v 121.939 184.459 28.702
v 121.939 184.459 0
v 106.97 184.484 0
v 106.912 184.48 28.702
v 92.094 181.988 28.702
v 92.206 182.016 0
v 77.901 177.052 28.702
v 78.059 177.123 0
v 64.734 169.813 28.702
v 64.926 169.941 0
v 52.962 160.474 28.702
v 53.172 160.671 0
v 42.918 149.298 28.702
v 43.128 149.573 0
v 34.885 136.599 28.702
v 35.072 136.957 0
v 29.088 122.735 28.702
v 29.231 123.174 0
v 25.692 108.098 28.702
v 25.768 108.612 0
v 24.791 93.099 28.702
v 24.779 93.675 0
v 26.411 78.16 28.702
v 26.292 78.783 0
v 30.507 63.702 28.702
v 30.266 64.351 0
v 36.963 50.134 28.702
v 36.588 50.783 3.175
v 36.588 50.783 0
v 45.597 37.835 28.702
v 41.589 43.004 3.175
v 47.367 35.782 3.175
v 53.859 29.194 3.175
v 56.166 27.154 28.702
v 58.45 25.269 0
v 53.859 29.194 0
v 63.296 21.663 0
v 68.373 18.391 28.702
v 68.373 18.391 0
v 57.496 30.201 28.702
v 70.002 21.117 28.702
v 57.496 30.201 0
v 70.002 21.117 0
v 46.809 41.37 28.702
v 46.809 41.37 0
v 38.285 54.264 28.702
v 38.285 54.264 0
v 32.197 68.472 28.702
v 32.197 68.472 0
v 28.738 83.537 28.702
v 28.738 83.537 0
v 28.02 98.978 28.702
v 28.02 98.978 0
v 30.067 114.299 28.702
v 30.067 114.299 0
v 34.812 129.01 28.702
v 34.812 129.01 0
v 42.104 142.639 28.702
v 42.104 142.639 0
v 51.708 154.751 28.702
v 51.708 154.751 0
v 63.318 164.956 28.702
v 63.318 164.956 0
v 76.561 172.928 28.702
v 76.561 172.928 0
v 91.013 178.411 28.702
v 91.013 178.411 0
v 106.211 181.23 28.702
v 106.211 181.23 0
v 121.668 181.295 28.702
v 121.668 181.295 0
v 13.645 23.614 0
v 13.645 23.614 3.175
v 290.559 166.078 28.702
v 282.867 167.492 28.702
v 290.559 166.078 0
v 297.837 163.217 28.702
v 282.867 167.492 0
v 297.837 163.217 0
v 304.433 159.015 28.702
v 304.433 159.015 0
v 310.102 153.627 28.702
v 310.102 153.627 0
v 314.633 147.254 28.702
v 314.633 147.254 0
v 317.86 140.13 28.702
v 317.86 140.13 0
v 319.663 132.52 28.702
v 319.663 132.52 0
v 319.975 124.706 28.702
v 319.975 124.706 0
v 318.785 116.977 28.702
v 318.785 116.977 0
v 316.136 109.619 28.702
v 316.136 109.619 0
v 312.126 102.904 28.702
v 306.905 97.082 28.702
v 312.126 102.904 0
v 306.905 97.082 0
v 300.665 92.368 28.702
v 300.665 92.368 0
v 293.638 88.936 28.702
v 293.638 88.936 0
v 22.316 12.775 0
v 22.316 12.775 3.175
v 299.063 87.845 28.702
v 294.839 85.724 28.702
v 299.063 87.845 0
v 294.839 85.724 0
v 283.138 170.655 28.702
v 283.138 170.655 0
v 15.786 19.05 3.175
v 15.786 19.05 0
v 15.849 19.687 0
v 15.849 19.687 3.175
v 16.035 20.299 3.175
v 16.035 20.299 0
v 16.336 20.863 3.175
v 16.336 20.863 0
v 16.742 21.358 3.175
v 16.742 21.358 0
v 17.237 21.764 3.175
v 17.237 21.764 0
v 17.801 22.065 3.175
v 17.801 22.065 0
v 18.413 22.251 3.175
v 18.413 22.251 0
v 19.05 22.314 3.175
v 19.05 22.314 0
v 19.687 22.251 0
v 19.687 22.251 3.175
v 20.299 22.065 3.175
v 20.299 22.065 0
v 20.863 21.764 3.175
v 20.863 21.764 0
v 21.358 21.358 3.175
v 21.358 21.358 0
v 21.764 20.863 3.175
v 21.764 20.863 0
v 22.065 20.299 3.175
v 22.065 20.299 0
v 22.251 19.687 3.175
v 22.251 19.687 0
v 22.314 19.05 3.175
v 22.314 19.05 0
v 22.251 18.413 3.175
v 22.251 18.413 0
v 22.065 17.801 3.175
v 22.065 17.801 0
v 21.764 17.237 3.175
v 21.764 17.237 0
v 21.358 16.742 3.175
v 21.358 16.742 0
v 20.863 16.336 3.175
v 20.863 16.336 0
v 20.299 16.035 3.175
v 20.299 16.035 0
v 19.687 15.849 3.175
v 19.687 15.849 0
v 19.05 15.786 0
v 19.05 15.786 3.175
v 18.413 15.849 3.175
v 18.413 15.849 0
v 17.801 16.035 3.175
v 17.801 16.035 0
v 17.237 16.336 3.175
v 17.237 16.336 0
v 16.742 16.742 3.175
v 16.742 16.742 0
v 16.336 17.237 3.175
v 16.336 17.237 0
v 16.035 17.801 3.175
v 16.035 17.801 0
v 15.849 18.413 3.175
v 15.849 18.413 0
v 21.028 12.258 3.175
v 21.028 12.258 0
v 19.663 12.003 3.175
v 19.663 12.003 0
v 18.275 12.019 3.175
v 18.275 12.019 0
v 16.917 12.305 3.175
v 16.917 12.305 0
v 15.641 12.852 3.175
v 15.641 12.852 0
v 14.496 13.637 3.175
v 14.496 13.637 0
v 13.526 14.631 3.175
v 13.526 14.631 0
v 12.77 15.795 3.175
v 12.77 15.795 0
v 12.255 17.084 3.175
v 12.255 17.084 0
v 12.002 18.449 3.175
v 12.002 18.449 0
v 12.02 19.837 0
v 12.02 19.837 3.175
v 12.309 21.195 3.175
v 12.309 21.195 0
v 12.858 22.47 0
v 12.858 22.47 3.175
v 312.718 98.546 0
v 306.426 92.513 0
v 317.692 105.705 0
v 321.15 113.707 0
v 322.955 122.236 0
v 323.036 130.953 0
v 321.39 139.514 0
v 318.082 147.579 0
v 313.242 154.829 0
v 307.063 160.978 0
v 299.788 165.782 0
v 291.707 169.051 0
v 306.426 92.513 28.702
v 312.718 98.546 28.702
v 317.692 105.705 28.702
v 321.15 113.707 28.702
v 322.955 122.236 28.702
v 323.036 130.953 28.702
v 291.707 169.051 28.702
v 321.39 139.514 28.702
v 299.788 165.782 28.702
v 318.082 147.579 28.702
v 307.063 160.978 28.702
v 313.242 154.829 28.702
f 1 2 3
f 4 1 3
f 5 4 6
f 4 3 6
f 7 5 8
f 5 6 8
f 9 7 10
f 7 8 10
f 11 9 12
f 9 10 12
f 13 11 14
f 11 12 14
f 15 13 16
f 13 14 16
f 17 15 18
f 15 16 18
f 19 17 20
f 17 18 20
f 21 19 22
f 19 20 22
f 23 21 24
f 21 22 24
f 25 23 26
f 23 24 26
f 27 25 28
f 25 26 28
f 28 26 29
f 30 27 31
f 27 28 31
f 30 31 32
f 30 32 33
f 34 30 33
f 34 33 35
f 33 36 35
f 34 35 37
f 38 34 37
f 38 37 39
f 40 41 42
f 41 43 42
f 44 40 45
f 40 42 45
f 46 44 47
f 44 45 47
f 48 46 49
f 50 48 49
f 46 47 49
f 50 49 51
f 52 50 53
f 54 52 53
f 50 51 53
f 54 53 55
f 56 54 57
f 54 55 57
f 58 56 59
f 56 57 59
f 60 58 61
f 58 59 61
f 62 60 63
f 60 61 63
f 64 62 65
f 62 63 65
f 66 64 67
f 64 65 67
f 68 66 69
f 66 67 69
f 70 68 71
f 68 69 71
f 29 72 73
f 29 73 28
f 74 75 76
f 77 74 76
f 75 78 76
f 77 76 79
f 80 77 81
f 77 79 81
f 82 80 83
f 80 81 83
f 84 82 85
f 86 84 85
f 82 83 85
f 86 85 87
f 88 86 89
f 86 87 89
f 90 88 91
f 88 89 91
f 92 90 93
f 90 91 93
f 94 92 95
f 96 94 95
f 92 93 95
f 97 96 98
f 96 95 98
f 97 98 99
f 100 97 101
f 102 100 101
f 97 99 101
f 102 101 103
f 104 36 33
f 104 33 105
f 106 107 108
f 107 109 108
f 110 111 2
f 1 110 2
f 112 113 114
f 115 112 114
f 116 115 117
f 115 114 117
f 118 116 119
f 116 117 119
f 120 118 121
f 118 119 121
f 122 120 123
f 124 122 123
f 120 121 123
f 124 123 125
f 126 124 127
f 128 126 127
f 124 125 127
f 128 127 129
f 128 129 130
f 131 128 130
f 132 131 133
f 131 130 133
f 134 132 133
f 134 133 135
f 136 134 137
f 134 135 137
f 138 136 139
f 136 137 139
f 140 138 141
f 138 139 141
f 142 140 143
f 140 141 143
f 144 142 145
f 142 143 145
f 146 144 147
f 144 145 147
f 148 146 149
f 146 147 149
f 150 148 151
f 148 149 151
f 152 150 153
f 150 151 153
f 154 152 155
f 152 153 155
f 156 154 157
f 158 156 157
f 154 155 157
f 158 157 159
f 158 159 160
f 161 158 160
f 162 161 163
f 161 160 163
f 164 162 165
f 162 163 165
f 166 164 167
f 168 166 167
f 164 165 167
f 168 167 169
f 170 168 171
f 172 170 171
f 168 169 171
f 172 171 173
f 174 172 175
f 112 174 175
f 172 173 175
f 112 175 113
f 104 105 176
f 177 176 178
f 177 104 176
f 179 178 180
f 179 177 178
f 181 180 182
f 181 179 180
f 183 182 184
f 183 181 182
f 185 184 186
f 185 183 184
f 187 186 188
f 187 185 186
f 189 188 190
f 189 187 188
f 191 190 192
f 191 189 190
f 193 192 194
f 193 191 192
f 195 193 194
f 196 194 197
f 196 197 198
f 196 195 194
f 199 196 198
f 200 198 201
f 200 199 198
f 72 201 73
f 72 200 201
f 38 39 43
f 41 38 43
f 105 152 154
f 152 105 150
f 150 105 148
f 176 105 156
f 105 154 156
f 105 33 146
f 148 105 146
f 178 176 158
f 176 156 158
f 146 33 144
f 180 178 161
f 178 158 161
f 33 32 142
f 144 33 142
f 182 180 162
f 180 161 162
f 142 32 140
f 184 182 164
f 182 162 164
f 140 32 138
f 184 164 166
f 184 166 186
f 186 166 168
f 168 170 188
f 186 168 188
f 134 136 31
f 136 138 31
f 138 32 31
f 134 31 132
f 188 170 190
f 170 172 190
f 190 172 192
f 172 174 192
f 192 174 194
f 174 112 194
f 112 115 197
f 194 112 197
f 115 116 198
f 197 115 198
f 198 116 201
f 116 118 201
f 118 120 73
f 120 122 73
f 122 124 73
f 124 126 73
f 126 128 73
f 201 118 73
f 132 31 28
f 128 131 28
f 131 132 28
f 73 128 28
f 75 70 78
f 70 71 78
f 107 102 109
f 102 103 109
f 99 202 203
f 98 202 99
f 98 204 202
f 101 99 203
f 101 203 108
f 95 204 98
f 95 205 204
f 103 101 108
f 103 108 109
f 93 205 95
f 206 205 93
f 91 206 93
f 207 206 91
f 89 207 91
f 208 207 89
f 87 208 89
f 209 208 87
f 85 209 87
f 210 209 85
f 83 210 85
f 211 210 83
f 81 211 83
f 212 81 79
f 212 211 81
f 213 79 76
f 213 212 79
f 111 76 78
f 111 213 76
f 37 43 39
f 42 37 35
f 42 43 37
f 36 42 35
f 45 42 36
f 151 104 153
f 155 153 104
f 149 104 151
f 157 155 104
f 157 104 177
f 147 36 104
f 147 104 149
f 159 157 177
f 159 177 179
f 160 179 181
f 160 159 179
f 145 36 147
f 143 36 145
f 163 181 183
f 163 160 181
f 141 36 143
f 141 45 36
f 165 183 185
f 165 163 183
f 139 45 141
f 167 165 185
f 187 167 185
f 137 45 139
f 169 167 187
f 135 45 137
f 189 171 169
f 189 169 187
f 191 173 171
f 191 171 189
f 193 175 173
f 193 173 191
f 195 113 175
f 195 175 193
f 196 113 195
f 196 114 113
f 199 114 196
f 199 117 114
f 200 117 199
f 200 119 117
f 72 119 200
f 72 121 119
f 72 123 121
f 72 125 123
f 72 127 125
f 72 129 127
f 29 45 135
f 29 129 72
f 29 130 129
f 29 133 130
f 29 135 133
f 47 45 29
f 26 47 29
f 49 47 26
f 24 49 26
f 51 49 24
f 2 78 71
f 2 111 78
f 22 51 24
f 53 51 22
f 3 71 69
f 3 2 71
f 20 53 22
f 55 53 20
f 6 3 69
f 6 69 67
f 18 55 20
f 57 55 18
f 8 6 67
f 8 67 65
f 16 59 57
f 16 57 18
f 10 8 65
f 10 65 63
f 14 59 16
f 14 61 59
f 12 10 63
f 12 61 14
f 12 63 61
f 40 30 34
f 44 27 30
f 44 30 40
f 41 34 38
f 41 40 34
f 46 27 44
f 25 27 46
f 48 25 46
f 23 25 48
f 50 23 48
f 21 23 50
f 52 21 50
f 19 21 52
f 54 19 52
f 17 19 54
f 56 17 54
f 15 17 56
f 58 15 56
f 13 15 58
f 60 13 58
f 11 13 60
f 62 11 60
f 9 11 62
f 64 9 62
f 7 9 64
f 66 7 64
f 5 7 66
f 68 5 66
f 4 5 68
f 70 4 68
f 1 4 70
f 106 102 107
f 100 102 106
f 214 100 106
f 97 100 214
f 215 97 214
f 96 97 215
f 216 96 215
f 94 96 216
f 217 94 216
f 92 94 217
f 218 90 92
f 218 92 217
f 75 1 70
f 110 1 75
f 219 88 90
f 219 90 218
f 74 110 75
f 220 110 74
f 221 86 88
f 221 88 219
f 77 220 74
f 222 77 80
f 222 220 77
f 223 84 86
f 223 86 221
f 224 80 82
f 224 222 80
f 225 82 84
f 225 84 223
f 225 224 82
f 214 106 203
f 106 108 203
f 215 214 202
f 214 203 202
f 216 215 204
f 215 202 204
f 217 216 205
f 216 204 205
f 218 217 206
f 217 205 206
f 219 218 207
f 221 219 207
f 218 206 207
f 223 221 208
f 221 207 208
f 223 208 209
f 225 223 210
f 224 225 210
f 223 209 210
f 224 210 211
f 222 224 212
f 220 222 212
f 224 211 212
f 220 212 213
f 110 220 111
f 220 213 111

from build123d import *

# Parameters (mm, degrees)
BOSS_EXTRUDE1_DEPTH = 25.4
SKETCH2_R           = 7.0739
SKETCH2_R_2         = 3.2639
BOSS_EXTRUDE2_DEPTH = 3.175
BOSS_EXTRUDE3_DEPTH = 3.302


with BuildPart() as part:
    # Sketch1 → Boss-Extrude1 (new body)
    with BuildSketch(Plane.XY):
        with BuildLine():
            ThreePointArc((70.001721328, 21.116929737), (32.109818913, 121.760822938), (121.667937999, 181.295122405))
            Line((121.667937999, 181.295122405), (282.867264941, 167.491822308))
            ThreePointArc((282.867264941, 167.491822308), (319.66332332, 132.52036188), (293.637822612, 88.935659637))
            Line((293.637822612, 88.935659637), (294.839214659, 85.723778364))
            Line((294.839214659, 85.723778364), (299.063190222, 87.84501085))
            ThreePointArc((299.063190222, 87.84501085), (322.426612475, 135.274348553), (283.138145015, 170.655245926))
            Line((283.138145015, 170.655245926), (121.938818073, 184.458546023))
            ThreePointArc((121.938818073, 184.458546023), (29.088121079, 122.735485546), (68.373108141, 18.391449213))
            Line((68.373108141, 18.391449213), (70.001721328, 21.116929737))
        make_face()
    extrude(amount=BOSS_EXTRUDE1_DEPTH)

    # Sketch2 → Boss-Extrude2 (add)
    # profile 1 of 2: a face of its own
    with BuildSketch(Plane(origin=(0, 0, 0), x_dir=(-1, 0, 0), z_dir=(0, 0, -1))):
        with BuildLine():
            ThreePointArc((-36.587701927, 50.782990283), (-44.384911147, 39.317928918), (-53.858754358, 29.194174745))
            Line((-53.858754358, 29.194174745), (-22.316186857, 12.775282108))
            ThreePointArc((-22.316186857, 12.775282108), (-23.932636358, 13.931413925), (-25.163710326, 15.491544259))
            ThreePointArc((-25.163710326, 15.491544259), (-23.930769686, 24.17036605), (-15.202863294, 24.986295173))
            ThreePointArc((-15.202863294, 24.986295173), (-14.373460165, 24.357545231), (-13.645291854, 23.613900861))
            Line((-13.645291854, 23.613900861), (-36.587701927, 50.782990283))
        make_face()
    # profile 2 of 2: a face of its own
    with BuildSketch(Plane(origin=(0, 0, 0), x_dir=(-1, 0, 0), z_dir=(0, 0, -1))):
        with Locations((-19.05, 19.05)):
            Circle(SKETCH2_R)
        with Locations((-19.05, 19.05)):
            Circle(SKETCH2_R_2, mode=Mode.SUBTRACT)
    extrude(amount=-BOSS_EXTRUDE2_DEPTH)

    # Sketch3 → Boss-Extrude3 (add)
    with BuildSketch(Plane.XY.offset(25.4)):
        with BuildLine():
            Line((68.373108141, 18.391449213), (70.001721328, 21.116929737))
            ThreePointArc((70.001721328, 21.116929737), (32.109818913, 121.760822938), (121.667937999, 181.295122405))
            Line((121.667937999, 181.295122405), (282.867264941, 167.491822308))
            ThreePointArc((282.867264941, 167.491822308), (319.66332332, 132.52036188), (293.637822612, 88.935659637))
            Line((293.637822612, 88.935659637), (294.839214659, 85.723778364))
            Line((294.839214659, 85.723778364), (299.063190222, 87.84501085))
            ThreePointArc((299.063190222, 87.84501085), (322.426612475, 135.274348553), (283.138145015, 170.655245926))
            Line((283.138145015, 170.655245926), (121.938818073, 184.458546023))
            ThreePointArc((121.938818073, 184.458546023), (29.088121079, 122.735485546), (68.373108141, 18.391449213))
        make_face()
    extrude(amount=BOSS_EXTRUDE3_DEPTH)


solid = part.part
